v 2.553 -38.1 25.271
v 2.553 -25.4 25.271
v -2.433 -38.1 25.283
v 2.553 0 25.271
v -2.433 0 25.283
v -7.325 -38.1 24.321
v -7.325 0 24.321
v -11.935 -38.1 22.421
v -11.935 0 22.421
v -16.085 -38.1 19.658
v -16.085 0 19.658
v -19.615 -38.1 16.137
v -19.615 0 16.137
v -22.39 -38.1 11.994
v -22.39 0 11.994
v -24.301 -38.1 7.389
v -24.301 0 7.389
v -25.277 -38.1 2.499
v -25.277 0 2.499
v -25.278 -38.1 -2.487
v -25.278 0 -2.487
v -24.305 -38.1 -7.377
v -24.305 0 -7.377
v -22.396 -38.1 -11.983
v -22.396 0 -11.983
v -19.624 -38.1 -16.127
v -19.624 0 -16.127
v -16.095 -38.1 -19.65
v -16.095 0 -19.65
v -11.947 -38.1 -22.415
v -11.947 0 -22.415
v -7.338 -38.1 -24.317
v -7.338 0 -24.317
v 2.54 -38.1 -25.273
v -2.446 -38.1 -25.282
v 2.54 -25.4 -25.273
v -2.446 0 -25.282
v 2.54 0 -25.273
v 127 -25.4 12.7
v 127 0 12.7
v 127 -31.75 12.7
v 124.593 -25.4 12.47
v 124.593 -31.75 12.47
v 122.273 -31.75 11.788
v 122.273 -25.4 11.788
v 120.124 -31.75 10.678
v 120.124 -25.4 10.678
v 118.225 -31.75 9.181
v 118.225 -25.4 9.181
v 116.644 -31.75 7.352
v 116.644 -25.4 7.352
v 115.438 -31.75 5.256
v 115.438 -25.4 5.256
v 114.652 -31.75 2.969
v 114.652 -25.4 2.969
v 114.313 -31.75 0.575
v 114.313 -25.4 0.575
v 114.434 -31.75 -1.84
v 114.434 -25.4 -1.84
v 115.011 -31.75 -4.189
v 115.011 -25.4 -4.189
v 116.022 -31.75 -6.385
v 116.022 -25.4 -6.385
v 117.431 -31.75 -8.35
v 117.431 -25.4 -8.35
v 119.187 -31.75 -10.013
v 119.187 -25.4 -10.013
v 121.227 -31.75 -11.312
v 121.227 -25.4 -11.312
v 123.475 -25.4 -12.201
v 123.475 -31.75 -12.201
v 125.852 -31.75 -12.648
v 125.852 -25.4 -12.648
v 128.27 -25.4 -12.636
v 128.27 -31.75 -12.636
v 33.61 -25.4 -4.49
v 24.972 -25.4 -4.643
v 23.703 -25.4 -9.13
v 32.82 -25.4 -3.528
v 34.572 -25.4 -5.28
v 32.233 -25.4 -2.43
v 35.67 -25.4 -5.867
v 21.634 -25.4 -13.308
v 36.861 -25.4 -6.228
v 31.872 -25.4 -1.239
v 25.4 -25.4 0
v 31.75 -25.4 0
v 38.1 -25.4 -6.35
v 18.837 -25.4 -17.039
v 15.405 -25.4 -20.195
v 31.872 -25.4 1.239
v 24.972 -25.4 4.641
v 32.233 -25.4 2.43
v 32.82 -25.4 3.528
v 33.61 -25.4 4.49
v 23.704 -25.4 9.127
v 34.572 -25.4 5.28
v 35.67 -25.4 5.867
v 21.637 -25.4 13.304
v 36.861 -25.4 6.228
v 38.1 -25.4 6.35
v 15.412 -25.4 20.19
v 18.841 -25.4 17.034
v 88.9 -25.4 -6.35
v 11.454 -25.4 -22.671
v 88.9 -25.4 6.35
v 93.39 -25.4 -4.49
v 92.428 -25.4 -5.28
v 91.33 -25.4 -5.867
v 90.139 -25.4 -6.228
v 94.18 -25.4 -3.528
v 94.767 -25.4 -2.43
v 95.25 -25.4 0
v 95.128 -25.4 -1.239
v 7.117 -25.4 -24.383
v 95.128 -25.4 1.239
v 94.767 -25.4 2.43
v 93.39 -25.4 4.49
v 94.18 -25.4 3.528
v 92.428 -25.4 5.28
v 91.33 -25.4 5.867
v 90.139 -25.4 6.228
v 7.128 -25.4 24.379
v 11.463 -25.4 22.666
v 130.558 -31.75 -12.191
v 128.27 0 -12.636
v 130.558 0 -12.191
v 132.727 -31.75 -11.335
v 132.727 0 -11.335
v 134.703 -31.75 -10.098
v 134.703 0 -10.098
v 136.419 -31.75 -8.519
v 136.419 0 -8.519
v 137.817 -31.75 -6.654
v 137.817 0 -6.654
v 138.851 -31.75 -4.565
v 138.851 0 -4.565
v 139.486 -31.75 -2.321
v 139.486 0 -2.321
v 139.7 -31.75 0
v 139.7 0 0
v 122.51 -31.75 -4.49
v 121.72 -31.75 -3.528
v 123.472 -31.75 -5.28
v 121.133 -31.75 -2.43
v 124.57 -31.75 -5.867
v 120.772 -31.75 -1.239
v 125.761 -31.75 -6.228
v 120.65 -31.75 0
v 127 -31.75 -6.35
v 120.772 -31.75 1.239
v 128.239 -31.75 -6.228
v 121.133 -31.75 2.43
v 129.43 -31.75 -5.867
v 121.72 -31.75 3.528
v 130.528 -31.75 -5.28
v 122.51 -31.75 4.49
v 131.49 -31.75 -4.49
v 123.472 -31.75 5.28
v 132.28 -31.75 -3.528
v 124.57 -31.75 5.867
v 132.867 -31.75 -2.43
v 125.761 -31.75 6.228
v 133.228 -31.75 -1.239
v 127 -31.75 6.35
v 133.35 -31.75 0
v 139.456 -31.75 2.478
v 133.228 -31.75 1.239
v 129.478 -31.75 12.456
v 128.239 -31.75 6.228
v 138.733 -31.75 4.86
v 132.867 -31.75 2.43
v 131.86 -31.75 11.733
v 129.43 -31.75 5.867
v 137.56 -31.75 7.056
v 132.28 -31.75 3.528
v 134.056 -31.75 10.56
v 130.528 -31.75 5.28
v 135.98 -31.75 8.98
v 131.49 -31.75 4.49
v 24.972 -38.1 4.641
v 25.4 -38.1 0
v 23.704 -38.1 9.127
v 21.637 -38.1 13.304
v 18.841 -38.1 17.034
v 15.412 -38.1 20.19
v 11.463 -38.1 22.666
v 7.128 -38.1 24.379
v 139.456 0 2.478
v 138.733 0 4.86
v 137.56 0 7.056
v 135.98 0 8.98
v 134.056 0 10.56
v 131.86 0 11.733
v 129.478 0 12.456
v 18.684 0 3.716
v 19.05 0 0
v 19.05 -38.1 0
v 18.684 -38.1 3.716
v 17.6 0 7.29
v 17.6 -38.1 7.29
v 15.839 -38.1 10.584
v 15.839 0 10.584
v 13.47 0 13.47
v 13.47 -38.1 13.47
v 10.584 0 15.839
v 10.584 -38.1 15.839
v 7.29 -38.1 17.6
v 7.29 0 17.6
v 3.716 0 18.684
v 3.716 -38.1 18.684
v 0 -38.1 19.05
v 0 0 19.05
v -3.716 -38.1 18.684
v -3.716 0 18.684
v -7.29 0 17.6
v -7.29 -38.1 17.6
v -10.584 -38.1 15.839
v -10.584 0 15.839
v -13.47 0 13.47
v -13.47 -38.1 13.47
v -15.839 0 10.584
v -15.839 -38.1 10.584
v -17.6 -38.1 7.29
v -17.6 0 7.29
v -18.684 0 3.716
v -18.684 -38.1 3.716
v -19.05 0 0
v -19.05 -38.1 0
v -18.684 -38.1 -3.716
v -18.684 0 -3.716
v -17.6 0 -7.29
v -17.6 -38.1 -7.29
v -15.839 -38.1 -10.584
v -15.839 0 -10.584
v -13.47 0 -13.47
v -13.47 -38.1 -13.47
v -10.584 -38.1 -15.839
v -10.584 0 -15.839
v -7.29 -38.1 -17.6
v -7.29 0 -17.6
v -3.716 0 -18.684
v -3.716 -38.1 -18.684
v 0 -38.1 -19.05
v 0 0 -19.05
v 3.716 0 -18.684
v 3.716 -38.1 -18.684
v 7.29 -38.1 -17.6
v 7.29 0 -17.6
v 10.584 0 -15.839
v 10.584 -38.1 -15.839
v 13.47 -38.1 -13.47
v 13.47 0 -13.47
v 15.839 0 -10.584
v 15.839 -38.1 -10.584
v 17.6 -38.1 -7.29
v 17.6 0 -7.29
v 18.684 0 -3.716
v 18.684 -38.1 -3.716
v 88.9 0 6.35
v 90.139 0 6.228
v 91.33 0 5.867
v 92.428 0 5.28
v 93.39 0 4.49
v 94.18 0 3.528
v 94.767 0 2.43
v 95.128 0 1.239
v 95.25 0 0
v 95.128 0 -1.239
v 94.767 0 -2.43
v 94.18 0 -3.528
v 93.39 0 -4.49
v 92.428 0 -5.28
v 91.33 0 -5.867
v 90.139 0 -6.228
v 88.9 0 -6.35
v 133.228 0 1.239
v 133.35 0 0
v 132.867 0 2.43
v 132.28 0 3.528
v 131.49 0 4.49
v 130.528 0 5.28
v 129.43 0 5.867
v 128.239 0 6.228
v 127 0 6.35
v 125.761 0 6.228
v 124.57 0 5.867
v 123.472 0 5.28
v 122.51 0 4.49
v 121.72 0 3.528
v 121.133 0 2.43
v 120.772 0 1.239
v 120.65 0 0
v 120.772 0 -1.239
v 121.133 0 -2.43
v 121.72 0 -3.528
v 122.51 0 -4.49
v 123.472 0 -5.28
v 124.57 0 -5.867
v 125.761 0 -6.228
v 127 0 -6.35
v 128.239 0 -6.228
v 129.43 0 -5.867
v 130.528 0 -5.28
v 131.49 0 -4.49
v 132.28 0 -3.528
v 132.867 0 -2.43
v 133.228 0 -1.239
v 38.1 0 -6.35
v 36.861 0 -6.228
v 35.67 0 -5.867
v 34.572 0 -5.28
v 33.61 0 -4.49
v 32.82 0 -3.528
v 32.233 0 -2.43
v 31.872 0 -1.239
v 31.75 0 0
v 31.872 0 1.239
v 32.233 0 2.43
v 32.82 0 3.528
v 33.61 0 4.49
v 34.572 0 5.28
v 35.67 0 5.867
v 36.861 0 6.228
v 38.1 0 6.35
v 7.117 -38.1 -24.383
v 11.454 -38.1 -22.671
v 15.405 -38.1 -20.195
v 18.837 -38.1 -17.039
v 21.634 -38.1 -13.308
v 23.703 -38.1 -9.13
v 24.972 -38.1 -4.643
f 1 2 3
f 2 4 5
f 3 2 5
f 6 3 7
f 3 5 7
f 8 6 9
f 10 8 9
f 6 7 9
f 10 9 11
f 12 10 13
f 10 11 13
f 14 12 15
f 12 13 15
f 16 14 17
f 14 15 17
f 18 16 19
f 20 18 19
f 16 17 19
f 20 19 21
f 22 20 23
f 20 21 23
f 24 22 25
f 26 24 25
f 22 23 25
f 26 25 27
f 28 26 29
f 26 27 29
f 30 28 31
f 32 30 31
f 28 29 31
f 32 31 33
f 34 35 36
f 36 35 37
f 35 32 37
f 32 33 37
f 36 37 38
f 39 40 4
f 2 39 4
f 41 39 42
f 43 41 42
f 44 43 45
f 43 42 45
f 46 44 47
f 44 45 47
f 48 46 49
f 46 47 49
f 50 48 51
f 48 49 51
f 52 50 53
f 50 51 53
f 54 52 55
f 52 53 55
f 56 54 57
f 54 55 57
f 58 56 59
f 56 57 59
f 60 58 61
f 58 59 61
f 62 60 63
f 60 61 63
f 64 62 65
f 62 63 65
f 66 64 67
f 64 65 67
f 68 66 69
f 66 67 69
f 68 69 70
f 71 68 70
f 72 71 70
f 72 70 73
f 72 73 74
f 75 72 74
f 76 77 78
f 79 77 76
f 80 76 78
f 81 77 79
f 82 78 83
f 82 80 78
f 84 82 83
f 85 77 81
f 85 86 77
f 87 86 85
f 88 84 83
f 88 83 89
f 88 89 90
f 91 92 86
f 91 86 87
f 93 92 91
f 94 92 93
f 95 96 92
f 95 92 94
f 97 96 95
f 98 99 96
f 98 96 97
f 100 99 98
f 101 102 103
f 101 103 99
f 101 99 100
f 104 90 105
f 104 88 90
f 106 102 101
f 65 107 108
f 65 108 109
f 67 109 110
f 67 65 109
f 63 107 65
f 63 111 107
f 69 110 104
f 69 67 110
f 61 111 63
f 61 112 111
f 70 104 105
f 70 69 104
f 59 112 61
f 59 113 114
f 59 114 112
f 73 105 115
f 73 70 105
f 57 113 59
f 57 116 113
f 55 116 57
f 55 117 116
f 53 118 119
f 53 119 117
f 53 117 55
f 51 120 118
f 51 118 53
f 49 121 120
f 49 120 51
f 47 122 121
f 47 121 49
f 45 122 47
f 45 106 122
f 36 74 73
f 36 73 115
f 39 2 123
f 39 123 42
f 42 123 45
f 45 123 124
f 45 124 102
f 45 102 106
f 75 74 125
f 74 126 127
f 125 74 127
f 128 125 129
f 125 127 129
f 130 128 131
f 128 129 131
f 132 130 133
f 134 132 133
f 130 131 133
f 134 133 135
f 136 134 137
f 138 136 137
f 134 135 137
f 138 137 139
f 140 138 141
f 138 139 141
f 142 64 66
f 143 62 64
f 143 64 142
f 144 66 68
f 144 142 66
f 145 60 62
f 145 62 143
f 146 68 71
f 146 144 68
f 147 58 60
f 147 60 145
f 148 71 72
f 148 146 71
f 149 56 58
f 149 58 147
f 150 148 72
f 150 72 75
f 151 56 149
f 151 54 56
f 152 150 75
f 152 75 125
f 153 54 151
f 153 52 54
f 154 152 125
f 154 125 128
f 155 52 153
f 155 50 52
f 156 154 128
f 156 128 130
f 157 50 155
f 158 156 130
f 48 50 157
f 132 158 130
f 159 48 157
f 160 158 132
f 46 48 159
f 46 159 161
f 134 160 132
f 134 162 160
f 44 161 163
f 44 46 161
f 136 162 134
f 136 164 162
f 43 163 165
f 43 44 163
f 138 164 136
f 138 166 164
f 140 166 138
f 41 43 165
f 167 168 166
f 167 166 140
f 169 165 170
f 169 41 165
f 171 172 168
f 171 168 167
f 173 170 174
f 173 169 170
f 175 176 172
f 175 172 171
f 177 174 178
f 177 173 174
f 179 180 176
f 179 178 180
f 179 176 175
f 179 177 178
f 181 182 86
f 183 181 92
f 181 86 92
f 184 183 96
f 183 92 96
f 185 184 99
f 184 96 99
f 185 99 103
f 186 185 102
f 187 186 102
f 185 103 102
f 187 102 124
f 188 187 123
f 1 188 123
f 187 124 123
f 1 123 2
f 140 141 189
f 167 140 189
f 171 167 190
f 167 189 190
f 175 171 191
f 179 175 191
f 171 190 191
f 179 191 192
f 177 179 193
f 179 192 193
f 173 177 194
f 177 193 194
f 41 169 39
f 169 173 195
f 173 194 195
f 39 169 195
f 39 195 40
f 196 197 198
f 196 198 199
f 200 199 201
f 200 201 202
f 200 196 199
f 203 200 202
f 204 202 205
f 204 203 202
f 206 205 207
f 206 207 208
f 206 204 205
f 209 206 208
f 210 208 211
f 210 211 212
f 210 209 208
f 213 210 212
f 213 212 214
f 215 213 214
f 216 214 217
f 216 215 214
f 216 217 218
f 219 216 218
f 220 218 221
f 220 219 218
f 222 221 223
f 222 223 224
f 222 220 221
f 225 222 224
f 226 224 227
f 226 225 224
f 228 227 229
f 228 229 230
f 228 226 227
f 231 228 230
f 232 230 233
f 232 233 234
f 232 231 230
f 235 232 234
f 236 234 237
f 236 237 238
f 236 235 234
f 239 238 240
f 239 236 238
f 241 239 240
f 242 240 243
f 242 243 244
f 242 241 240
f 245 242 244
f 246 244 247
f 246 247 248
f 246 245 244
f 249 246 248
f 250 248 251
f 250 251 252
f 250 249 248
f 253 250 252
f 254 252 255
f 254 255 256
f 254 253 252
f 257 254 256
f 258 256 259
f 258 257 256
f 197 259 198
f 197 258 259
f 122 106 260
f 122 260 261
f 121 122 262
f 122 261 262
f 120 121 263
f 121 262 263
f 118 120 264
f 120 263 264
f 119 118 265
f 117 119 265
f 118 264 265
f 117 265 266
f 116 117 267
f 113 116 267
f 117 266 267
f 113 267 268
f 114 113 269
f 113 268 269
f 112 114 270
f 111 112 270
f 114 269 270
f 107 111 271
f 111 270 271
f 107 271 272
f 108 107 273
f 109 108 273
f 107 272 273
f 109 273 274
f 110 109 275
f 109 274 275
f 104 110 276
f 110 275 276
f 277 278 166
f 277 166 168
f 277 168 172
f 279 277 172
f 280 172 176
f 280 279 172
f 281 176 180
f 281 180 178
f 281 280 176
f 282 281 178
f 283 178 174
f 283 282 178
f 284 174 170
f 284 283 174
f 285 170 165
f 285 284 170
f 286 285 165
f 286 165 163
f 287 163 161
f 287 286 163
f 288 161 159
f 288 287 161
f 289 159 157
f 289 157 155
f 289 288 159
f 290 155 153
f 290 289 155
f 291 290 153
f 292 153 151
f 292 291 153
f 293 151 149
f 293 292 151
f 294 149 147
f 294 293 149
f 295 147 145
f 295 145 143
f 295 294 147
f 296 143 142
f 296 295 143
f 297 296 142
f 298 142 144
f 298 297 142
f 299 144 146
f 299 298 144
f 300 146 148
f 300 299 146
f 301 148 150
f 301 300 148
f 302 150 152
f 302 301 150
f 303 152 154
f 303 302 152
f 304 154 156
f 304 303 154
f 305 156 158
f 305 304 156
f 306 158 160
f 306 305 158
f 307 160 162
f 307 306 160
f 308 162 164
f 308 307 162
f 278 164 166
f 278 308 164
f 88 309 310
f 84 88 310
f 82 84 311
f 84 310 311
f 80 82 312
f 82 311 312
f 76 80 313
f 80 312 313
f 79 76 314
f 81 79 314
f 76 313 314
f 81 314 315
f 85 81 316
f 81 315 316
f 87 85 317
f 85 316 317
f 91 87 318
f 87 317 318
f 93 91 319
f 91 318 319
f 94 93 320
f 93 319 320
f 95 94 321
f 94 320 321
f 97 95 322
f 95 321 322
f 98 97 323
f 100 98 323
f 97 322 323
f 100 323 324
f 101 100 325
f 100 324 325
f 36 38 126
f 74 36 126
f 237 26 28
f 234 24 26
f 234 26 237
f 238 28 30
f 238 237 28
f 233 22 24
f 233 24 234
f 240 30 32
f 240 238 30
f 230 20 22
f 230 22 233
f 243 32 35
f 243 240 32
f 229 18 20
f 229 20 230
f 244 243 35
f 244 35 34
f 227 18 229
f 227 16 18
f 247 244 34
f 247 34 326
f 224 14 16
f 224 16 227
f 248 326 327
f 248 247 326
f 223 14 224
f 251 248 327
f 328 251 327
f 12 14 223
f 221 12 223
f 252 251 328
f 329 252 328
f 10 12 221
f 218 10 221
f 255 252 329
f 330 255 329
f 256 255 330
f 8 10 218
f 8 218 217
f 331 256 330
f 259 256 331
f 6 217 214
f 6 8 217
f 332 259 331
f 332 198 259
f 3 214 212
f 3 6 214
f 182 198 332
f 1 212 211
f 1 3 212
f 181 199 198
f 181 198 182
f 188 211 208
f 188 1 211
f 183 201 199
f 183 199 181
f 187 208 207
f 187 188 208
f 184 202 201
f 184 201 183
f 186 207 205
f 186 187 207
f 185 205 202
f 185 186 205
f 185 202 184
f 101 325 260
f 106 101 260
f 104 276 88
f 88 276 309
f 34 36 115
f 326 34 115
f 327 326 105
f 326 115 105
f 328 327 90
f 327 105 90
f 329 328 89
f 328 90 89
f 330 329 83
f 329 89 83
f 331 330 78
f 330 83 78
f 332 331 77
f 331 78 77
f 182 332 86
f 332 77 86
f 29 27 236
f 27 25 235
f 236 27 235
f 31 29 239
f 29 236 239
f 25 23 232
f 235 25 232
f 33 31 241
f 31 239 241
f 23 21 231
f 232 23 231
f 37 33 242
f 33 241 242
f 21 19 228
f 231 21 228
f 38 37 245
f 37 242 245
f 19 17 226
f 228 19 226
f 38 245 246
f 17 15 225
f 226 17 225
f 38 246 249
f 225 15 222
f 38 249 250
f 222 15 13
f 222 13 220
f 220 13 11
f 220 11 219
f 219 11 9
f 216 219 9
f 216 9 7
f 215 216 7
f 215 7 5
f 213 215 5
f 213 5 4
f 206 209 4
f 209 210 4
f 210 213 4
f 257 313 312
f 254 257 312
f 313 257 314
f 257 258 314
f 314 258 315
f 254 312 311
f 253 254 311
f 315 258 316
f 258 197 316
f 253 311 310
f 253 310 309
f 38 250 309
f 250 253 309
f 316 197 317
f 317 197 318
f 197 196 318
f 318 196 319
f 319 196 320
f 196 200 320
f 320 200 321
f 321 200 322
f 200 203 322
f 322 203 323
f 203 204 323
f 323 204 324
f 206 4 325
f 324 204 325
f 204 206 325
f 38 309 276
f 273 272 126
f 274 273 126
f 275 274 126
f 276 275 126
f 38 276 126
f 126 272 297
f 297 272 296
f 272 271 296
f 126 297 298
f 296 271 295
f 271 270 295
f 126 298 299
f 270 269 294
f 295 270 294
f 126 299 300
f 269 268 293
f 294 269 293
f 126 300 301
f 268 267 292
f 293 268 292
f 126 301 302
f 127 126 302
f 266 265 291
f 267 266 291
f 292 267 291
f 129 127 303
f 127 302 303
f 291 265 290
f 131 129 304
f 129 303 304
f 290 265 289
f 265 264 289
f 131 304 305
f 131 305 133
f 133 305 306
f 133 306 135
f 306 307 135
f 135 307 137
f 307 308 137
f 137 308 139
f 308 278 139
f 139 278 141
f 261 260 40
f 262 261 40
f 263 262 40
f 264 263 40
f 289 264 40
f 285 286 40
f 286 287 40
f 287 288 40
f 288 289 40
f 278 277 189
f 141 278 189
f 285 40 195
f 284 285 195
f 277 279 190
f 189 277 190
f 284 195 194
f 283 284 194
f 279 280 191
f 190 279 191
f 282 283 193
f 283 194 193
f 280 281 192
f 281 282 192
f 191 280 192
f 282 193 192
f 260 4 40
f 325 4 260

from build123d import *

# Parameters (mm, degrees)
F0_R     = 19.05
F1_DEPTH = 38.1
F2_DEPTH = 25.4
F0_R_2   = 6.35
F3_DEPTH = 31.75


with BuildPart() as f1:
    # F0 (on Front) → F1 (new body)
    with BuildSketch(Plane.XZ):
        with BuildLine():
            ThreePointArc((2.540001, -25.272681), (18.837144, -17.038838), (25.4, 0))
            ThreePointArc((25.4, 0), (18.841479, 17.034044), (2.552862, 25.271385))
            ThreePointArc((2.552862, 25.271385), (-25.399999, 0.006463), (2.540001, -25.272681))
        make_face()
        Circle(F0_R, mode=Mode.SUBTRACT)
    extrude(amount=F1_DEPTH)

    # F0 (on Front) → F2 (join)
    with BuildSketch(Plane.XZ):
        with BuildLine():
            ThreePointArc((2.552862, 25.271385), (18.841479, 17.034044), (25.4, 0))
            ThreePointArc((25.4, 0), (18.837144, -17.038838), (2.540001, -25.272681))
            Line((2.540001, -25.272681), (128.27, -12.63634))
            ThreePointArc((128.27, -12.63634), (114.315925, -0.635797), (127, 12.7))
            Line((127, 12.7), (2.552862, 25.271385))
        make_face()
        with BuildLine():
            ThreePointArc((38.1, -6.35), (31.75, 0), (38.1, 6.35))
            Line((38.1, 6.35), (88.9, 6.35))
            ThreePointArc((88.9, 6.35), (95.25, 0), (88.9, -6.35))
            Line((88.9, -6.35), (38.1, -6.35))
        make_face(mode=Mode.SUBTRACT)
    extrude(amount=F2_DEPTH)

    # F0 (on Front) → F3 (join)
    with BuildSketch(Plane.XZ):
        with BuildLine():
            ThreePointArc((139.7, 0), (135.980256, 8.980256), (127, 12.7))
            ThreePointArc((127, 12.7), (114.315925, -0.635797), (128.27, -12.63634))
            ThreePointArc((128.27, -12.63634), (136.418572, -8.519419), (139.7, 0))
        make_face()
        with Locations((127, 0)):
            Circle(F0_R_2, mode=Mode.SUBTRACT)
    extrude(amount=F3_DEPTH)


solid = f1.part
